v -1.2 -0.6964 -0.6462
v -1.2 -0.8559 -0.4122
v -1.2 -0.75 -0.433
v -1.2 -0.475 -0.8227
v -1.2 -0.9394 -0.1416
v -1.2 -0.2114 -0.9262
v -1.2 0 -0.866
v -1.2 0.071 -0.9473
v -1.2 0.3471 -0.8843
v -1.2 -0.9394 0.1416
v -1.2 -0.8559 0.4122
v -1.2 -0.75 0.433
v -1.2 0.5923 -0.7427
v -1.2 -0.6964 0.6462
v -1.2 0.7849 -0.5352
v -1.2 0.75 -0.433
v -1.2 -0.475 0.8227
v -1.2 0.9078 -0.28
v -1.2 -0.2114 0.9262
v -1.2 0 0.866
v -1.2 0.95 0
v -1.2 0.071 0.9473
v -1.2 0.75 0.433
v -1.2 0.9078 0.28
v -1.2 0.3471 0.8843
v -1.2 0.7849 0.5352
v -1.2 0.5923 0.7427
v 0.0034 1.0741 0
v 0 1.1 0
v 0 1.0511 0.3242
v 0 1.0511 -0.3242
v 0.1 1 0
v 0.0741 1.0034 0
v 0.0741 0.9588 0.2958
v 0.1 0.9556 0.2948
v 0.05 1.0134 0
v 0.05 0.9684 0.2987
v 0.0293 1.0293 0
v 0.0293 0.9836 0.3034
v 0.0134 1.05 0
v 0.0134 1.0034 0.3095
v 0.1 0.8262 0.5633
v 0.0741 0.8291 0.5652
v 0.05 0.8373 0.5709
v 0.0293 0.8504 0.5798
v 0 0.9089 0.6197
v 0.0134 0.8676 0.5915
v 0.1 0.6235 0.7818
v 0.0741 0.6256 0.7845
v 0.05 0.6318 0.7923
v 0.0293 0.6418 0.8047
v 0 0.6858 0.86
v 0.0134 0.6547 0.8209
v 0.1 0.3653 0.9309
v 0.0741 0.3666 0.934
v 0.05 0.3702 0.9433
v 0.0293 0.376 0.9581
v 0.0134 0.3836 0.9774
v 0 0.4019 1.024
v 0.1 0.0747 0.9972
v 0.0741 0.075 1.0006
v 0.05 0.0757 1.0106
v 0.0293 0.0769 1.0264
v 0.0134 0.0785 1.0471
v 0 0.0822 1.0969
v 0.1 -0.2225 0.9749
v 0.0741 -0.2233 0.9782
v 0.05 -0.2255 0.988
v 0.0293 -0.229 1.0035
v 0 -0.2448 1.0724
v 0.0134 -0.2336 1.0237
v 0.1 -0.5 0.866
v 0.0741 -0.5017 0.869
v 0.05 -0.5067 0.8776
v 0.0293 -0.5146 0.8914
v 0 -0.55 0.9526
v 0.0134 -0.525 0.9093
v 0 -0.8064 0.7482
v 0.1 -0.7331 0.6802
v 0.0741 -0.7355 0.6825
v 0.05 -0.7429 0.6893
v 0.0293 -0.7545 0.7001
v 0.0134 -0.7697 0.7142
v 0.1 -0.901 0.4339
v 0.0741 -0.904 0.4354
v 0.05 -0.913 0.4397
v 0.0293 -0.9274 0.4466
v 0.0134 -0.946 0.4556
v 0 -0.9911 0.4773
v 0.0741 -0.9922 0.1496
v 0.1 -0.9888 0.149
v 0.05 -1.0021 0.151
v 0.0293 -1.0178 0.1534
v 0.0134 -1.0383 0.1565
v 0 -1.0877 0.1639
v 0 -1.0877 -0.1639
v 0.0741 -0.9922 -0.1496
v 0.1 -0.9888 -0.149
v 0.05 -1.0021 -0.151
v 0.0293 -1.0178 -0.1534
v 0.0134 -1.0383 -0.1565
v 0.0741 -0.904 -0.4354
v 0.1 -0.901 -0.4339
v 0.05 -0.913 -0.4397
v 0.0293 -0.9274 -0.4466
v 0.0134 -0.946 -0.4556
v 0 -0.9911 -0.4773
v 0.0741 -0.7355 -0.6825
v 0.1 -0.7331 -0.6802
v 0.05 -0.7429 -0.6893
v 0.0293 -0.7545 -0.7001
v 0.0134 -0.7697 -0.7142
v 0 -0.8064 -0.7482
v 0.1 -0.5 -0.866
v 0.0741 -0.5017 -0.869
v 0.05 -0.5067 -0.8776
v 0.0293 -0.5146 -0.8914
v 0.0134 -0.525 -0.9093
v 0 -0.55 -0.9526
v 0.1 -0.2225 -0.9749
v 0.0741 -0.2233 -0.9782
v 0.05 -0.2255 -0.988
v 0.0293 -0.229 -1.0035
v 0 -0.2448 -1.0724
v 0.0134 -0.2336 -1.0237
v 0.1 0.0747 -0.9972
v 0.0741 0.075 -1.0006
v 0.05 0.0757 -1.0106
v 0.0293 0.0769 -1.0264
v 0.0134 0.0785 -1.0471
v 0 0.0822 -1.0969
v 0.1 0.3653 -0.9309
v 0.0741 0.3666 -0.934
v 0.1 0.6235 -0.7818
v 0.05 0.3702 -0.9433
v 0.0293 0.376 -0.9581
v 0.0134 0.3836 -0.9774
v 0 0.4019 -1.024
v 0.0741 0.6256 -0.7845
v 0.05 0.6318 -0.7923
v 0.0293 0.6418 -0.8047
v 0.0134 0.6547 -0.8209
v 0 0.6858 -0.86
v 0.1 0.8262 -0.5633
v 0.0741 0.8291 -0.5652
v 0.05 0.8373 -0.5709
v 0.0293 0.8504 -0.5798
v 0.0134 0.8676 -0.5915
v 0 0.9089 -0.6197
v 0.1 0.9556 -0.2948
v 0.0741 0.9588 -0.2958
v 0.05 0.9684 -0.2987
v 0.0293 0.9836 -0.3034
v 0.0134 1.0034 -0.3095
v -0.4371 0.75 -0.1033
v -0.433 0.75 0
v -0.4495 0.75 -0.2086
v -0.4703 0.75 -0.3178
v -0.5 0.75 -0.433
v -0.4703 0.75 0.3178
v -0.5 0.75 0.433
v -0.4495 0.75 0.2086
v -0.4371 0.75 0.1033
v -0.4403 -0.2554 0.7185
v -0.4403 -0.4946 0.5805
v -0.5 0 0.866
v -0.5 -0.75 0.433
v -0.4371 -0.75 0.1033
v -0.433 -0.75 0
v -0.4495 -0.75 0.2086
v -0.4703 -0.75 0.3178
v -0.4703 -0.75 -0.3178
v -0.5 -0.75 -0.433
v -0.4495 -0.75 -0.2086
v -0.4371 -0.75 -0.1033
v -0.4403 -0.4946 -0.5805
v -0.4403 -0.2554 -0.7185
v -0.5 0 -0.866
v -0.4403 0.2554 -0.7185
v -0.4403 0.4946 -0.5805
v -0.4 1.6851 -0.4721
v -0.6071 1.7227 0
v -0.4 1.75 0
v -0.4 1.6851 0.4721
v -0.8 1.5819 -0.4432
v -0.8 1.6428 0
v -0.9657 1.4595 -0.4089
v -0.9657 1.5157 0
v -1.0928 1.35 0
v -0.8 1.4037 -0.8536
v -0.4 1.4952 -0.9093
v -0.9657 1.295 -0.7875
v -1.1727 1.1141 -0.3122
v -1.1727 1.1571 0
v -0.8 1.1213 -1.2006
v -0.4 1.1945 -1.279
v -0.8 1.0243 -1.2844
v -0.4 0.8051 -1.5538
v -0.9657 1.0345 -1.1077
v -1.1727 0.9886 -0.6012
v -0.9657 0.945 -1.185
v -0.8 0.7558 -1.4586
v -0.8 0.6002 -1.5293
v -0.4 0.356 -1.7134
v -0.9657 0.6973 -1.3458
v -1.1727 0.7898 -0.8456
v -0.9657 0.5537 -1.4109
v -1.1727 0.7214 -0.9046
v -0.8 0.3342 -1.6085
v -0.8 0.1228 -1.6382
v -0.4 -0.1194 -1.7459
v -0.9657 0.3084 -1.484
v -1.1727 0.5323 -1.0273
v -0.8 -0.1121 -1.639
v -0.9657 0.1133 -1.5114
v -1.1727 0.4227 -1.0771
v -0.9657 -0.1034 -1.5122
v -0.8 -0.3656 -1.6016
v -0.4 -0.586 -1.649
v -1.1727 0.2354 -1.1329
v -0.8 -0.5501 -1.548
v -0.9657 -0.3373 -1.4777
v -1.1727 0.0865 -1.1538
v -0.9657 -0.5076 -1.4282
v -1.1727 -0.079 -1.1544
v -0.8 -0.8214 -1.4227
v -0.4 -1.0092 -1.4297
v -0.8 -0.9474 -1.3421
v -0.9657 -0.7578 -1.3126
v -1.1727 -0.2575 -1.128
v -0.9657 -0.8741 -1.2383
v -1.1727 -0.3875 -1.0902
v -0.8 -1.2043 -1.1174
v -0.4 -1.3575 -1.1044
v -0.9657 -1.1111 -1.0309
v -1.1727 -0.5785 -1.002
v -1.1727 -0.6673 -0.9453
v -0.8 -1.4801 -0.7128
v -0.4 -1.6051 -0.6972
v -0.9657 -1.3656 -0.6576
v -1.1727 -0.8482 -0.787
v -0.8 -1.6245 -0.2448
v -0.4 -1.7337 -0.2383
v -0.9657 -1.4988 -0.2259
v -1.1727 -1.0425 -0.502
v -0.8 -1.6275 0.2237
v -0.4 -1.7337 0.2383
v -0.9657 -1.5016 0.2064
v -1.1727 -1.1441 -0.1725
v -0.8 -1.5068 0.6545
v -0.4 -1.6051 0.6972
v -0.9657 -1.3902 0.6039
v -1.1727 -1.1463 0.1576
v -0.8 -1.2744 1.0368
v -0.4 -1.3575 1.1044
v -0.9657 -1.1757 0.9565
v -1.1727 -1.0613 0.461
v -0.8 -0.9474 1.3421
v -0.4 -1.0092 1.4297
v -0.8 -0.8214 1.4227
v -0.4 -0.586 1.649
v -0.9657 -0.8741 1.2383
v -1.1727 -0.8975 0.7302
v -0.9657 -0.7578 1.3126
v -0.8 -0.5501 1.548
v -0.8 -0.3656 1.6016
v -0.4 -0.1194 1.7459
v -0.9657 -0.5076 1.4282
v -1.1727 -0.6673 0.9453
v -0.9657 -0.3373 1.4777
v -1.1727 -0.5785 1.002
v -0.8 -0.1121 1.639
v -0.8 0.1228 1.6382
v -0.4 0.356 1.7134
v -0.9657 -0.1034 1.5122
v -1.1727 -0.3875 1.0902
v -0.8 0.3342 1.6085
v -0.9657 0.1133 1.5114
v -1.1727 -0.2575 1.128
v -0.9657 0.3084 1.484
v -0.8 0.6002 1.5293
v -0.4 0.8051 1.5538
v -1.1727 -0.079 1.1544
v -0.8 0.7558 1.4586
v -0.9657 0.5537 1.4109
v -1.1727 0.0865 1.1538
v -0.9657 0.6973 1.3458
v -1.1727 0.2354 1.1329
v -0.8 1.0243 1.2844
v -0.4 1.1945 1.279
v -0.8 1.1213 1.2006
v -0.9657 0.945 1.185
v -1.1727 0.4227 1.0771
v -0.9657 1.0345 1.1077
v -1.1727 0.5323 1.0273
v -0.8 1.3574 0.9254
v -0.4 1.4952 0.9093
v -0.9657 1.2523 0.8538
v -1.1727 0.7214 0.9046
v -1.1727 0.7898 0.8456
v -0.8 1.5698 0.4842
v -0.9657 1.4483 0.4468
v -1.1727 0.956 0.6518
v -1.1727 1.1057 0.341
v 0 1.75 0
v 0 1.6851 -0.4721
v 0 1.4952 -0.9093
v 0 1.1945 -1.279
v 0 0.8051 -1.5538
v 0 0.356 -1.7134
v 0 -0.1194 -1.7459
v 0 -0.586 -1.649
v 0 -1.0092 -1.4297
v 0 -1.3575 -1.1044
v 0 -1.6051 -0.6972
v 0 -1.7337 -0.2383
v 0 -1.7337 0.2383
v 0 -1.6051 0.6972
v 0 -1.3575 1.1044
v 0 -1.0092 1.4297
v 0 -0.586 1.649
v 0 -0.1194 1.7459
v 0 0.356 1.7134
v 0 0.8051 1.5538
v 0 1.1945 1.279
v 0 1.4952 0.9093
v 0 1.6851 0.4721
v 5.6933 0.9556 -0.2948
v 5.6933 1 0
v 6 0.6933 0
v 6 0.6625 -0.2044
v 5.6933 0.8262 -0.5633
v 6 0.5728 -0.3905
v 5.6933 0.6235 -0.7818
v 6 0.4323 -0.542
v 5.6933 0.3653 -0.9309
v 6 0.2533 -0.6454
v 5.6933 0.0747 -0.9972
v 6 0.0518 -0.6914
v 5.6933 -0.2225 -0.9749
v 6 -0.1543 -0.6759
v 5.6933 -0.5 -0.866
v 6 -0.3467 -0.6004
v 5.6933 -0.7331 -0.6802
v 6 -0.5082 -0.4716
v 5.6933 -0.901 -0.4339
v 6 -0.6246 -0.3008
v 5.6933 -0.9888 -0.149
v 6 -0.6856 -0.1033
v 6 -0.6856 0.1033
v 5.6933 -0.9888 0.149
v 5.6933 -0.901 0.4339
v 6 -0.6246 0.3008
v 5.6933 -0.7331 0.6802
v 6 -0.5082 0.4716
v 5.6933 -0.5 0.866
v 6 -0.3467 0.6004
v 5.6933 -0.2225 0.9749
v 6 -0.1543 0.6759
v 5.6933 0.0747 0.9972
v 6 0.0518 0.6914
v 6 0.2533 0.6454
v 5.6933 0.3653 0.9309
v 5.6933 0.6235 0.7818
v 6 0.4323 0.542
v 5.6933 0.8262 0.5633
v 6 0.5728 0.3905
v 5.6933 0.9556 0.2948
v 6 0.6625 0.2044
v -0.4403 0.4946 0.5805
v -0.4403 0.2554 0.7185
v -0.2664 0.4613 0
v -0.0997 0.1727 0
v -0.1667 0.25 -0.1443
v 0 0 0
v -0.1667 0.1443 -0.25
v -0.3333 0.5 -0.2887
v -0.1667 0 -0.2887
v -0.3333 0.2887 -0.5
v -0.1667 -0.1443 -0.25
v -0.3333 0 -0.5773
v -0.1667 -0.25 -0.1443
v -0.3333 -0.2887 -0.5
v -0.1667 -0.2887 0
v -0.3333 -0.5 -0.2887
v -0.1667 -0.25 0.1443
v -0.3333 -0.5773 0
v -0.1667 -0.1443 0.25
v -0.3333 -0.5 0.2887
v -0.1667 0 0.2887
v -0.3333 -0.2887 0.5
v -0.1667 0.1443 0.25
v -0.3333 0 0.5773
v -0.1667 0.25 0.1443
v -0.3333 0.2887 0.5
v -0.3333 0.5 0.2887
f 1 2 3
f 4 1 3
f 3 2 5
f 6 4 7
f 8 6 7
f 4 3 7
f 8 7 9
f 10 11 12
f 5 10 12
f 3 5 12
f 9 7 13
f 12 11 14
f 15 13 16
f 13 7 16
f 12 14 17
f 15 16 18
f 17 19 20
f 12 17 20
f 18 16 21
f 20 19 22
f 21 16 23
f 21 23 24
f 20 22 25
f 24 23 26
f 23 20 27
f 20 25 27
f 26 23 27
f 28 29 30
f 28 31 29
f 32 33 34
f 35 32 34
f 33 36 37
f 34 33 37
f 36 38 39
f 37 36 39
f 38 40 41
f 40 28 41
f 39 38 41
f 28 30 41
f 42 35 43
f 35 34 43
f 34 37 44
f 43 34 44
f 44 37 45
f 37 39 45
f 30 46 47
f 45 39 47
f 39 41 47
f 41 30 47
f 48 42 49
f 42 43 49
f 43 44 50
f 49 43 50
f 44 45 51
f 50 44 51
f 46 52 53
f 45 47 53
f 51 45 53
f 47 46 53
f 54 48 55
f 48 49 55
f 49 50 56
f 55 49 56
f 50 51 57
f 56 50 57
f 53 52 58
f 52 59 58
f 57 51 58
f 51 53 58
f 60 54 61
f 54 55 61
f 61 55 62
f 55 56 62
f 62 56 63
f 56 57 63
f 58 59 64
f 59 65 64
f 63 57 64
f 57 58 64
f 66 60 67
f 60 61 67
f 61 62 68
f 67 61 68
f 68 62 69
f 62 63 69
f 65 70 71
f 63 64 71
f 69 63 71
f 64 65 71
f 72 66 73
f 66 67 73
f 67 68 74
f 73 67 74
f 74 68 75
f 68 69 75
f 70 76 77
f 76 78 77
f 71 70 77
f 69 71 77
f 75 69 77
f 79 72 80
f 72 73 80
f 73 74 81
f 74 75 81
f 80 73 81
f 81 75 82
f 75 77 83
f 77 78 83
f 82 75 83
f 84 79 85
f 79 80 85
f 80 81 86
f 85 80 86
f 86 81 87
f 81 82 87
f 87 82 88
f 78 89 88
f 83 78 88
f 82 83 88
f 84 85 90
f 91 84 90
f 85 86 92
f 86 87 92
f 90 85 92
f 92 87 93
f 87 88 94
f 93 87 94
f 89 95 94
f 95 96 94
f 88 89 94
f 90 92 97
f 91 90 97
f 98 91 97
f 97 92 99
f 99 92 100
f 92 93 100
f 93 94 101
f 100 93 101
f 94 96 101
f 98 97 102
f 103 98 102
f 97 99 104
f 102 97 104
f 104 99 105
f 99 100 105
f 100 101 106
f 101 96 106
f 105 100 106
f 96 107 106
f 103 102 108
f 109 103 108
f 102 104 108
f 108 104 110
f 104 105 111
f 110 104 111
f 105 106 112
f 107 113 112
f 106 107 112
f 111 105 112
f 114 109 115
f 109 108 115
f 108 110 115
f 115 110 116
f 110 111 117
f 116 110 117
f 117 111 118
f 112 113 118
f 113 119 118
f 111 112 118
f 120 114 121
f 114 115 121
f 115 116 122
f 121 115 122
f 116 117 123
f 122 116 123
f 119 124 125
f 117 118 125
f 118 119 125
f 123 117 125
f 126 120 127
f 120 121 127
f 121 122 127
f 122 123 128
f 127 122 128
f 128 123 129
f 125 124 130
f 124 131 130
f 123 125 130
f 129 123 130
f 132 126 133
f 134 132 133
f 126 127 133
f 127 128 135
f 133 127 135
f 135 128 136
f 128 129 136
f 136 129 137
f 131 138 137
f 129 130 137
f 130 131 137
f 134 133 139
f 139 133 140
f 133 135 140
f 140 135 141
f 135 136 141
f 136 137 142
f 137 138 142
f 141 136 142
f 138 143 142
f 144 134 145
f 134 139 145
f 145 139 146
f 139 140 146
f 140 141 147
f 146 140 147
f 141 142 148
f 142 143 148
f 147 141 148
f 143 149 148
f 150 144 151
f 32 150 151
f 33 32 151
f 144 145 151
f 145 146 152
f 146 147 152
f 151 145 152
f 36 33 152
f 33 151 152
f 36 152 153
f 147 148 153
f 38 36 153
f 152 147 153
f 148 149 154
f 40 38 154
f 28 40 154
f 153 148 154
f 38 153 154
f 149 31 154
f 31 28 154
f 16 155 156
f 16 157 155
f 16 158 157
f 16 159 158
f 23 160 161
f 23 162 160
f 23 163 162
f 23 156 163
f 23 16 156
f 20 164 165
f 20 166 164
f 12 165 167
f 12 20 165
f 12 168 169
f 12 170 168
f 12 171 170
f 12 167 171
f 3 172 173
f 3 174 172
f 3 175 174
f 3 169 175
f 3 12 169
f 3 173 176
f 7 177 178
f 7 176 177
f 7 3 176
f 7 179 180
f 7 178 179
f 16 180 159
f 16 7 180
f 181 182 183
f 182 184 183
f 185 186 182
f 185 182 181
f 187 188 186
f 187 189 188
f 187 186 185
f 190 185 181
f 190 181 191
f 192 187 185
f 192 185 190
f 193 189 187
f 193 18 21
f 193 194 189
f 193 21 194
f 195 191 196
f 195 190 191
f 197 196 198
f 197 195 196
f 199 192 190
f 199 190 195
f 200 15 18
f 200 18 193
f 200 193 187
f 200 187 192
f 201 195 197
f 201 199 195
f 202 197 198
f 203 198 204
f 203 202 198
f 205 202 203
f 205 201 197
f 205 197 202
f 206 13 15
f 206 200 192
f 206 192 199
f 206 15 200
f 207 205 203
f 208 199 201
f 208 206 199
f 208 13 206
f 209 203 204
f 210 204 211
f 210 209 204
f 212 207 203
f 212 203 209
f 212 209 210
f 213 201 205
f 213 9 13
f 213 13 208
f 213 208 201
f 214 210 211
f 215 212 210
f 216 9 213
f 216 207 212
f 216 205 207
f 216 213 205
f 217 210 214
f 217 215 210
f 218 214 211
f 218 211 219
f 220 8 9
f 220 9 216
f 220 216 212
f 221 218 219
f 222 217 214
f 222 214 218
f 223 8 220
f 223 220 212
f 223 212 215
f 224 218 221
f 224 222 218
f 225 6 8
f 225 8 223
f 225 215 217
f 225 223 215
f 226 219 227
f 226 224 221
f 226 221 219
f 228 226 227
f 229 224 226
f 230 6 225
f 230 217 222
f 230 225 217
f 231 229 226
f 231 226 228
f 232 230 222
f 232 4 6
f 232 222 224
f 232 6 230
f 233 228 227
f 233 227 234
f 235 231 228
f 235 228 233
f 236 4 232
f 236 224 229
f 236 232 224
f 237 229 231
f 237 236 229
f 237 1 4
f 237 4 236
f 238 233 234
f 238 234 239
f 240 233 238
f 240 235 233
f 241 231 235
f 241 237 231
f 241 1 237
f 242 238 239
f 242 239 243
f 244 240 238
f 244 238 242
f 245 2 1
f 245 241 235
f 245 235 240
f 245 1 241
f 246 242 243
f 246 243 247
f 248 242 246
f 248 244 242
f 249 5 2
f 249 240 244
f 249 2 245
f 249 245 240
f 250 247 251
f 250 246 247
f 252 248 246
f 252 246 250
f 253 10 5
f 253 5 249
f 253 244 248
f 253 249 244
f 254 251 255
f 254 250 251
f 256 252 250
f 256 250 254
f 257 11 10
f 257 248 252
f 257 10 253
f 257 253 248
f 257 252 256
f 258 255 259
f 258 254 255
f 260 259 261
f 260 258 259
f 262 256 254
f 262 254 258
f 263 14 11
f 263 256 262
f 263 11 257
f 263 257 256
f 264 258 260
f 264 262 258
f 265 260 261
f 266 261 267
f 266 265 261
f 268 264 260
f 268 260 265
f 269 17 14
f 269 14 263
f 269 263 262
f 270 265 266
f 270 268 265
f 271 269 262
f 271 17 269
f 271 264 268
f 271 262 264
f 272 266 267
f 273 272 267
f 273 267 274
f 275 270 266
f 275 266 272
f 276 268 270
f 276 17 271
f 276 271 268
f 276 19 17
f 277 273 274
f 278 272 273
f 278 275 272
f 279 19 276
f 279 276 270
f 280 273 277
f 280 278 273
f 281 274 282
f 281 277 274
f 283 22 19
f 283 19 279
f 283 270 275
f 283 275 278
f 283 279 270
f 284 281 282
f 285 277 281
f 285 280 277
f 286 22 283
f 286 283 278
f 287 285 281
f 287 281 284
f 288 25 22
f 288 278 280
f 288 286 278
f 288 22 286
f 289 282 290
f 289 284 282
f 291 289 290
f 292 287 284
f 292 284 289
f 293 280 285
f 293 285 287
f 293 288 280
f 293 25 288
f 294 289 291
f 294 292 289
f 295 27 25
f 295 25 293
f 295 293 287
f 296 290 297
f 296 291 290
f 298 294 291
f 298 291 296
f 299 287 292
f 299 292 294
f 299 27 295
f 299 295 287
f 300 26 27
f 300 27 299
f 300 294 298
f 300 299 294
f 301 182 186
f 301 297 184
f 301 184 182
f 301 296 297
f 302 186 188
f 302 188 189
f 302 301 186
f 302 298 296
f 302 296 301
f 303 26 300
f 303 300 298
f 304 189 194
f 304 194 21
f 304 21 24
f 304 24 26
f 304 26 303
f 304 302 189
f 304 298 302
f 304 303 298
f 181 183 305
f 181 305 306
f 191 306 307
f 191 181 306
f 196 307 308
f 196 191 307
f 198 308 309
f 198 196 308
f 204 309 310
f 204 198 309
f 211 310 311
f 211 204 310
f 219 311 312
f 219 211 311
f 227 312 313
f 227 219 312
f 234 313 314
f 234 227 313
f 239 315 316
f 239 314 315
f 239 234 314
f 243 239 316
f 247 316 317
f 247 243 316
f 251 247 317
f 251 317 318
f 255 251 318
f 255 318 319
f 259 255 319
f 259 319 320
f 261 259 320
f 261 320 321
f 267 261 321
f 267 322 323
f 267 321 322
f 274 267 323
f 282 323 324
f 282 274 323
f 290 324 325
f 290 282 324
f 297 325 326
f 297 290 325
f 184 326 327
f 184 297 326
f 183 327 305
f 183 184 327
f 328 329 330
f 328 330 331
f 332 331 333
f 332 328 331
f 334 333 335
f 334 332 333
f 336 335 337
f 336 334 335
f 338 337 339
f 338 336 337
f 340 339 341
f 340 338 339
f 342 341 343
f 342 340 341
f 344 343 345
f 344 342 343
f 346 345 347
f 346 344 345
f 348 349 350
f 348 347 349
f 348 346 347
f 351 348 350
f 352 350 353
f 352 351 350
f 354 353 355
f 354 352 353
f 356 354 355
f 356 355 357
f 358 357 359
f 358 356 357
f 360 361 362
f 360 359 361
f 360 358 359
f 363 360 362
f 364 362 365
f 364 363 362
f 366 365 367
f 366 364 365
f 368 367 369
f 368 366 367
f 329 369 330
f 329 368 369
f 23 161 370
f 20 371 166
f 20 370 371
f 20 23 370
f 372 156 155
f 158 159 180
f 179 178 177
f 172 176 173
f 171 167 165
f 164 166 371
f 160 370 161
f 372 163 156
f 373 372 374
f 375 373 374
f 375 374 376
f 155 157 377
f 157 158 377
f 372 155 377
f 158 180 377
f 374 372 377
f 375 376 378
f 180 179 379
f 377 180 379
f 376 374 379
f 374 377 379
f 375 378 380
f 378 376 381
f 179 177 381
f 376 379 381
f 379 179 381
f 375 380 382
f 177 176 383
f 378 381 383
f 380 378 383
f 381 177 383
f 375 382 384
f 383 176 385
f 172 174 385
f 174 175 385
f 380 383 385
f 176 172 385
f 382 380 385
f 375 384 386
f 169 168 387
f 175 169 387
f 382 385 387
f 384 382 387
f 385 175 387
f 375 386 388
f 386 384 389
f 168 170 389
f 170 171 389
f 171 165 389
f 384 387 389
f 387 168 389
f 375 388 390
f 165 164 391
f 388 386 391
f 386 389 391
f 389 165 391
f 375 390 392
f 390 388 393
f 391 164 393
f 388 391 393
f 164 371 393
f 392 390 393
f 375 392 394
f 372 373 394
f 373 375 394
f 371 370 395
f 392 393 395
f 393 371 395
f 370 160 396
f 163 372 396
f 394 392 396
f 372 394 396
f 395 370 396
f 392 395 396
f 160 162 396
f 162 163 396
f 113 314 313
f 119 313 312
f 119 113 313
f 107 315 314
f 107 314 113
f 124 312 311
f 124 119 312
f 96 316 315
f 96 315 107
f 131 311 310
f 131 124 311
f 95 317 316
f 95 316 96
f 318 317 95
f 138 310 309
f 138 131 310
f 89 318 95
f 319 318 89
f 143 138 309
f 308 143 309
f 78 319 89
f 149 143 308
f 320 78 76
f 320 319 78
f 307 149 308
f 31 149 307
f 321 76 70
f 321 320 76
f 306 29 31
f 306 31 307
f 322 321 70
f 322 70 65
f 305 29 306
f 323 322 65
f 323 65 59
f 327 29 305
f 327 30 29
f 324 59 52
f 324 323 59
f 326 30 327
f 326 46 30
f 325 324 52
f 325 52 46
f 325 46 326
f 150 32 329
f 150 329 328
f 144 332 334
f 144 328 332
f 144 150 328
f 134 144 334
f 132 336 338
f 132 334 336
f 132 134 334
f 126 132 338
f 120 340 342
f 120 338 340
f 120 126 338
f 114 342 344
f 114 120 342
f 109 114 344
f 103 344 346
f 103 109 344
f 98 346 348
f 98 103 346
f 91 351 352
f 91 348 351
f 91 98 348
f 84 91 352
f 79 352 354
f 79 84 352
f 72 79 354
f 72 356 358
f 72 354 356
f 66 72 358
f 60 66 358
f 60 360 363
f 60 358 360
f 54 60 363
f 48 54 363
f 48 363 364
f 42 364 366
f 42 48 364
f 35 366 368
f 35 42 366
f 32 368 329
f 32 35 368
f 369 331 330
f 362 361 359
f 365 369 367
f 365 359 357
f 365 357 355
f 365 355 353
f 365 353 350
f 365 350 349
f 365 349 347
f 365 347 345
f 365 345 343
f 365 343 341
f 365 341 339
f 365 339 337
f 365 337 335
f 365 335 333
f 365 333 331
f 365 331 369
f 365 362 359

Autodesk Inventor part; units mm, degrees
ref_plane "YZ Plane" through (0, 0, 0) normal (1, 0, 0) x (0, 1, 0)
ref_plane "XZ Plane" through (0, 0, 0) normal (0, 1, 0) x (-1, 0, 0)
sketch "Sketch1" plane through (0, 0, 0) normal (0, 0, 1) x (1, 0, 0)
  line L0 (0, 0) -> (6, 0)
  line L1 (6, 0) -> (6, 1)
  line L2 (6, 1) -> (1.5, 1)
  line L3 (1.5, 1) -> (1.1932, 1)
  line L4 (1.1932, 1) -> (0, 1)
  line L5 (0, 1) -> (0, 1.75)
  line L6 (0, 1.75) -> (-1.2, 1.75)
  line L7 (-1.2, 1.75) -> (-1.2, 0.866)
  line L8 (-1.2, 0.866) -> (-0.5, 0.866)
  line L9 (-0.5, 0.866) -> (0, 0)
  line L10 (-2.64, 0) -> (7.44, 0) projected
  line L11 (0, -0.35) -> (0, 2.1) projected
  line L12 (1.5, 1) -> (0, 1) construction
  dimension "d1" = 4.5
  dimension "d2" = 0.3068
  dimension "d3" = 1.2
  dimension "d4" = 0.7
  dimension "d5" = 60
  dimension "d6" = 2
  dimension "d7" = 2
  dimension "d8" = 1.7321
  dimension "d9" = 3.5
  dimension "d26" = 6
revolve "Body" add sketch "Sketch1" angle 360 about axis through (0, 0, 0) along (1, 0, 0)
sketch "Sketch2" plane through (-1.2, 0, 0) normal (-1, 0, 0) x (0, 0, 1)
  circle A0 centre (0, 0) radius 0.866 projected
  line L0 (0, -2.45) -> (0, 2.45) projected
  line L1 (-2.45, 0) -> (2.45, 0) projected
  line L2 (0.866, 0) -> (0.433, -0.75)
  line L3 (0.433, -0.75) -> (-0.433, -0.75)
  line L4 (-0.433, -0.75) -> (-0.866, 0)
  line L5 (-0.866, 0) -> (-0.433, 0.75)
  line L6 (-0.433, 0.75) -> (0.433, 0.75)
  line L7 (0.433, 0.75) -> (0.866, 0)
extrude "Slot" add sketch "Sketch2" against normal up to next contours L7 A0 | A0 L2 | L6 L0 A0 | A0 L0 L3 | L0 L6 A0 | A0 L3 L0 | L4 A0 | A0 L5
fillet "Fillet1" radius 0.8 1 edges at (-1.2, -1.75, 0)
chamfer "Chamfer1" distance 0.3067 distance2 0.3067 1 edges at (6, -1, 0) measured on face at (6, 0.1182, 0.3117)
ref_plane "Work Plane1" through (29, 0, 0) normal (0, -1, 0) x (1, 0, 0)
fillet "Fillet2" radius 0.1 1 edges at (0, -1, 0)
thread "Thread2" size "M2x0.4" class "6g" standard "ANSI Metric M Profile" full length
equation "\"d15\" = -0.5 * SPD + 0.5 * GD"
equation "\"d16\" = GUL"
equation "\"d1\" = GEL"
equation "\"GD\" = NND"
equation "\"NLG\" = 6"
equation "\"GEL\" = 4.5"
equation "\"KOD\" = 5.7"
equation "\"KOH\" = 1.65"
equation "\"INTI\" = 1.04"
equation "\"GAL\" = 0.61345 * PTC"
equation "\"GUL\" = 0.61345 * PTC"
equation "\"BDM\" = NND"
equation "\"SW\" = 2"
equation "\"RR\" = 1.45"
equation "\"SPD\" = NND - 1.2269 * PTC"
equation "\"R\" = 0.3"
equation "\"TOA\" = 30deg"
equation "\"GD1\" = THREADDIA - 1.2269 * PTC"
equation "\"THREADDIA\" = 3"
equation "\"PTC\" = 0.5"
equation "\"NND\" = 3"
equation "\"KOH1\" = 0.2"
equation "\"E0\" = 2.303"
properties part number "ISO 7380-1 - M3 x 6" material "Stainless Steel"
